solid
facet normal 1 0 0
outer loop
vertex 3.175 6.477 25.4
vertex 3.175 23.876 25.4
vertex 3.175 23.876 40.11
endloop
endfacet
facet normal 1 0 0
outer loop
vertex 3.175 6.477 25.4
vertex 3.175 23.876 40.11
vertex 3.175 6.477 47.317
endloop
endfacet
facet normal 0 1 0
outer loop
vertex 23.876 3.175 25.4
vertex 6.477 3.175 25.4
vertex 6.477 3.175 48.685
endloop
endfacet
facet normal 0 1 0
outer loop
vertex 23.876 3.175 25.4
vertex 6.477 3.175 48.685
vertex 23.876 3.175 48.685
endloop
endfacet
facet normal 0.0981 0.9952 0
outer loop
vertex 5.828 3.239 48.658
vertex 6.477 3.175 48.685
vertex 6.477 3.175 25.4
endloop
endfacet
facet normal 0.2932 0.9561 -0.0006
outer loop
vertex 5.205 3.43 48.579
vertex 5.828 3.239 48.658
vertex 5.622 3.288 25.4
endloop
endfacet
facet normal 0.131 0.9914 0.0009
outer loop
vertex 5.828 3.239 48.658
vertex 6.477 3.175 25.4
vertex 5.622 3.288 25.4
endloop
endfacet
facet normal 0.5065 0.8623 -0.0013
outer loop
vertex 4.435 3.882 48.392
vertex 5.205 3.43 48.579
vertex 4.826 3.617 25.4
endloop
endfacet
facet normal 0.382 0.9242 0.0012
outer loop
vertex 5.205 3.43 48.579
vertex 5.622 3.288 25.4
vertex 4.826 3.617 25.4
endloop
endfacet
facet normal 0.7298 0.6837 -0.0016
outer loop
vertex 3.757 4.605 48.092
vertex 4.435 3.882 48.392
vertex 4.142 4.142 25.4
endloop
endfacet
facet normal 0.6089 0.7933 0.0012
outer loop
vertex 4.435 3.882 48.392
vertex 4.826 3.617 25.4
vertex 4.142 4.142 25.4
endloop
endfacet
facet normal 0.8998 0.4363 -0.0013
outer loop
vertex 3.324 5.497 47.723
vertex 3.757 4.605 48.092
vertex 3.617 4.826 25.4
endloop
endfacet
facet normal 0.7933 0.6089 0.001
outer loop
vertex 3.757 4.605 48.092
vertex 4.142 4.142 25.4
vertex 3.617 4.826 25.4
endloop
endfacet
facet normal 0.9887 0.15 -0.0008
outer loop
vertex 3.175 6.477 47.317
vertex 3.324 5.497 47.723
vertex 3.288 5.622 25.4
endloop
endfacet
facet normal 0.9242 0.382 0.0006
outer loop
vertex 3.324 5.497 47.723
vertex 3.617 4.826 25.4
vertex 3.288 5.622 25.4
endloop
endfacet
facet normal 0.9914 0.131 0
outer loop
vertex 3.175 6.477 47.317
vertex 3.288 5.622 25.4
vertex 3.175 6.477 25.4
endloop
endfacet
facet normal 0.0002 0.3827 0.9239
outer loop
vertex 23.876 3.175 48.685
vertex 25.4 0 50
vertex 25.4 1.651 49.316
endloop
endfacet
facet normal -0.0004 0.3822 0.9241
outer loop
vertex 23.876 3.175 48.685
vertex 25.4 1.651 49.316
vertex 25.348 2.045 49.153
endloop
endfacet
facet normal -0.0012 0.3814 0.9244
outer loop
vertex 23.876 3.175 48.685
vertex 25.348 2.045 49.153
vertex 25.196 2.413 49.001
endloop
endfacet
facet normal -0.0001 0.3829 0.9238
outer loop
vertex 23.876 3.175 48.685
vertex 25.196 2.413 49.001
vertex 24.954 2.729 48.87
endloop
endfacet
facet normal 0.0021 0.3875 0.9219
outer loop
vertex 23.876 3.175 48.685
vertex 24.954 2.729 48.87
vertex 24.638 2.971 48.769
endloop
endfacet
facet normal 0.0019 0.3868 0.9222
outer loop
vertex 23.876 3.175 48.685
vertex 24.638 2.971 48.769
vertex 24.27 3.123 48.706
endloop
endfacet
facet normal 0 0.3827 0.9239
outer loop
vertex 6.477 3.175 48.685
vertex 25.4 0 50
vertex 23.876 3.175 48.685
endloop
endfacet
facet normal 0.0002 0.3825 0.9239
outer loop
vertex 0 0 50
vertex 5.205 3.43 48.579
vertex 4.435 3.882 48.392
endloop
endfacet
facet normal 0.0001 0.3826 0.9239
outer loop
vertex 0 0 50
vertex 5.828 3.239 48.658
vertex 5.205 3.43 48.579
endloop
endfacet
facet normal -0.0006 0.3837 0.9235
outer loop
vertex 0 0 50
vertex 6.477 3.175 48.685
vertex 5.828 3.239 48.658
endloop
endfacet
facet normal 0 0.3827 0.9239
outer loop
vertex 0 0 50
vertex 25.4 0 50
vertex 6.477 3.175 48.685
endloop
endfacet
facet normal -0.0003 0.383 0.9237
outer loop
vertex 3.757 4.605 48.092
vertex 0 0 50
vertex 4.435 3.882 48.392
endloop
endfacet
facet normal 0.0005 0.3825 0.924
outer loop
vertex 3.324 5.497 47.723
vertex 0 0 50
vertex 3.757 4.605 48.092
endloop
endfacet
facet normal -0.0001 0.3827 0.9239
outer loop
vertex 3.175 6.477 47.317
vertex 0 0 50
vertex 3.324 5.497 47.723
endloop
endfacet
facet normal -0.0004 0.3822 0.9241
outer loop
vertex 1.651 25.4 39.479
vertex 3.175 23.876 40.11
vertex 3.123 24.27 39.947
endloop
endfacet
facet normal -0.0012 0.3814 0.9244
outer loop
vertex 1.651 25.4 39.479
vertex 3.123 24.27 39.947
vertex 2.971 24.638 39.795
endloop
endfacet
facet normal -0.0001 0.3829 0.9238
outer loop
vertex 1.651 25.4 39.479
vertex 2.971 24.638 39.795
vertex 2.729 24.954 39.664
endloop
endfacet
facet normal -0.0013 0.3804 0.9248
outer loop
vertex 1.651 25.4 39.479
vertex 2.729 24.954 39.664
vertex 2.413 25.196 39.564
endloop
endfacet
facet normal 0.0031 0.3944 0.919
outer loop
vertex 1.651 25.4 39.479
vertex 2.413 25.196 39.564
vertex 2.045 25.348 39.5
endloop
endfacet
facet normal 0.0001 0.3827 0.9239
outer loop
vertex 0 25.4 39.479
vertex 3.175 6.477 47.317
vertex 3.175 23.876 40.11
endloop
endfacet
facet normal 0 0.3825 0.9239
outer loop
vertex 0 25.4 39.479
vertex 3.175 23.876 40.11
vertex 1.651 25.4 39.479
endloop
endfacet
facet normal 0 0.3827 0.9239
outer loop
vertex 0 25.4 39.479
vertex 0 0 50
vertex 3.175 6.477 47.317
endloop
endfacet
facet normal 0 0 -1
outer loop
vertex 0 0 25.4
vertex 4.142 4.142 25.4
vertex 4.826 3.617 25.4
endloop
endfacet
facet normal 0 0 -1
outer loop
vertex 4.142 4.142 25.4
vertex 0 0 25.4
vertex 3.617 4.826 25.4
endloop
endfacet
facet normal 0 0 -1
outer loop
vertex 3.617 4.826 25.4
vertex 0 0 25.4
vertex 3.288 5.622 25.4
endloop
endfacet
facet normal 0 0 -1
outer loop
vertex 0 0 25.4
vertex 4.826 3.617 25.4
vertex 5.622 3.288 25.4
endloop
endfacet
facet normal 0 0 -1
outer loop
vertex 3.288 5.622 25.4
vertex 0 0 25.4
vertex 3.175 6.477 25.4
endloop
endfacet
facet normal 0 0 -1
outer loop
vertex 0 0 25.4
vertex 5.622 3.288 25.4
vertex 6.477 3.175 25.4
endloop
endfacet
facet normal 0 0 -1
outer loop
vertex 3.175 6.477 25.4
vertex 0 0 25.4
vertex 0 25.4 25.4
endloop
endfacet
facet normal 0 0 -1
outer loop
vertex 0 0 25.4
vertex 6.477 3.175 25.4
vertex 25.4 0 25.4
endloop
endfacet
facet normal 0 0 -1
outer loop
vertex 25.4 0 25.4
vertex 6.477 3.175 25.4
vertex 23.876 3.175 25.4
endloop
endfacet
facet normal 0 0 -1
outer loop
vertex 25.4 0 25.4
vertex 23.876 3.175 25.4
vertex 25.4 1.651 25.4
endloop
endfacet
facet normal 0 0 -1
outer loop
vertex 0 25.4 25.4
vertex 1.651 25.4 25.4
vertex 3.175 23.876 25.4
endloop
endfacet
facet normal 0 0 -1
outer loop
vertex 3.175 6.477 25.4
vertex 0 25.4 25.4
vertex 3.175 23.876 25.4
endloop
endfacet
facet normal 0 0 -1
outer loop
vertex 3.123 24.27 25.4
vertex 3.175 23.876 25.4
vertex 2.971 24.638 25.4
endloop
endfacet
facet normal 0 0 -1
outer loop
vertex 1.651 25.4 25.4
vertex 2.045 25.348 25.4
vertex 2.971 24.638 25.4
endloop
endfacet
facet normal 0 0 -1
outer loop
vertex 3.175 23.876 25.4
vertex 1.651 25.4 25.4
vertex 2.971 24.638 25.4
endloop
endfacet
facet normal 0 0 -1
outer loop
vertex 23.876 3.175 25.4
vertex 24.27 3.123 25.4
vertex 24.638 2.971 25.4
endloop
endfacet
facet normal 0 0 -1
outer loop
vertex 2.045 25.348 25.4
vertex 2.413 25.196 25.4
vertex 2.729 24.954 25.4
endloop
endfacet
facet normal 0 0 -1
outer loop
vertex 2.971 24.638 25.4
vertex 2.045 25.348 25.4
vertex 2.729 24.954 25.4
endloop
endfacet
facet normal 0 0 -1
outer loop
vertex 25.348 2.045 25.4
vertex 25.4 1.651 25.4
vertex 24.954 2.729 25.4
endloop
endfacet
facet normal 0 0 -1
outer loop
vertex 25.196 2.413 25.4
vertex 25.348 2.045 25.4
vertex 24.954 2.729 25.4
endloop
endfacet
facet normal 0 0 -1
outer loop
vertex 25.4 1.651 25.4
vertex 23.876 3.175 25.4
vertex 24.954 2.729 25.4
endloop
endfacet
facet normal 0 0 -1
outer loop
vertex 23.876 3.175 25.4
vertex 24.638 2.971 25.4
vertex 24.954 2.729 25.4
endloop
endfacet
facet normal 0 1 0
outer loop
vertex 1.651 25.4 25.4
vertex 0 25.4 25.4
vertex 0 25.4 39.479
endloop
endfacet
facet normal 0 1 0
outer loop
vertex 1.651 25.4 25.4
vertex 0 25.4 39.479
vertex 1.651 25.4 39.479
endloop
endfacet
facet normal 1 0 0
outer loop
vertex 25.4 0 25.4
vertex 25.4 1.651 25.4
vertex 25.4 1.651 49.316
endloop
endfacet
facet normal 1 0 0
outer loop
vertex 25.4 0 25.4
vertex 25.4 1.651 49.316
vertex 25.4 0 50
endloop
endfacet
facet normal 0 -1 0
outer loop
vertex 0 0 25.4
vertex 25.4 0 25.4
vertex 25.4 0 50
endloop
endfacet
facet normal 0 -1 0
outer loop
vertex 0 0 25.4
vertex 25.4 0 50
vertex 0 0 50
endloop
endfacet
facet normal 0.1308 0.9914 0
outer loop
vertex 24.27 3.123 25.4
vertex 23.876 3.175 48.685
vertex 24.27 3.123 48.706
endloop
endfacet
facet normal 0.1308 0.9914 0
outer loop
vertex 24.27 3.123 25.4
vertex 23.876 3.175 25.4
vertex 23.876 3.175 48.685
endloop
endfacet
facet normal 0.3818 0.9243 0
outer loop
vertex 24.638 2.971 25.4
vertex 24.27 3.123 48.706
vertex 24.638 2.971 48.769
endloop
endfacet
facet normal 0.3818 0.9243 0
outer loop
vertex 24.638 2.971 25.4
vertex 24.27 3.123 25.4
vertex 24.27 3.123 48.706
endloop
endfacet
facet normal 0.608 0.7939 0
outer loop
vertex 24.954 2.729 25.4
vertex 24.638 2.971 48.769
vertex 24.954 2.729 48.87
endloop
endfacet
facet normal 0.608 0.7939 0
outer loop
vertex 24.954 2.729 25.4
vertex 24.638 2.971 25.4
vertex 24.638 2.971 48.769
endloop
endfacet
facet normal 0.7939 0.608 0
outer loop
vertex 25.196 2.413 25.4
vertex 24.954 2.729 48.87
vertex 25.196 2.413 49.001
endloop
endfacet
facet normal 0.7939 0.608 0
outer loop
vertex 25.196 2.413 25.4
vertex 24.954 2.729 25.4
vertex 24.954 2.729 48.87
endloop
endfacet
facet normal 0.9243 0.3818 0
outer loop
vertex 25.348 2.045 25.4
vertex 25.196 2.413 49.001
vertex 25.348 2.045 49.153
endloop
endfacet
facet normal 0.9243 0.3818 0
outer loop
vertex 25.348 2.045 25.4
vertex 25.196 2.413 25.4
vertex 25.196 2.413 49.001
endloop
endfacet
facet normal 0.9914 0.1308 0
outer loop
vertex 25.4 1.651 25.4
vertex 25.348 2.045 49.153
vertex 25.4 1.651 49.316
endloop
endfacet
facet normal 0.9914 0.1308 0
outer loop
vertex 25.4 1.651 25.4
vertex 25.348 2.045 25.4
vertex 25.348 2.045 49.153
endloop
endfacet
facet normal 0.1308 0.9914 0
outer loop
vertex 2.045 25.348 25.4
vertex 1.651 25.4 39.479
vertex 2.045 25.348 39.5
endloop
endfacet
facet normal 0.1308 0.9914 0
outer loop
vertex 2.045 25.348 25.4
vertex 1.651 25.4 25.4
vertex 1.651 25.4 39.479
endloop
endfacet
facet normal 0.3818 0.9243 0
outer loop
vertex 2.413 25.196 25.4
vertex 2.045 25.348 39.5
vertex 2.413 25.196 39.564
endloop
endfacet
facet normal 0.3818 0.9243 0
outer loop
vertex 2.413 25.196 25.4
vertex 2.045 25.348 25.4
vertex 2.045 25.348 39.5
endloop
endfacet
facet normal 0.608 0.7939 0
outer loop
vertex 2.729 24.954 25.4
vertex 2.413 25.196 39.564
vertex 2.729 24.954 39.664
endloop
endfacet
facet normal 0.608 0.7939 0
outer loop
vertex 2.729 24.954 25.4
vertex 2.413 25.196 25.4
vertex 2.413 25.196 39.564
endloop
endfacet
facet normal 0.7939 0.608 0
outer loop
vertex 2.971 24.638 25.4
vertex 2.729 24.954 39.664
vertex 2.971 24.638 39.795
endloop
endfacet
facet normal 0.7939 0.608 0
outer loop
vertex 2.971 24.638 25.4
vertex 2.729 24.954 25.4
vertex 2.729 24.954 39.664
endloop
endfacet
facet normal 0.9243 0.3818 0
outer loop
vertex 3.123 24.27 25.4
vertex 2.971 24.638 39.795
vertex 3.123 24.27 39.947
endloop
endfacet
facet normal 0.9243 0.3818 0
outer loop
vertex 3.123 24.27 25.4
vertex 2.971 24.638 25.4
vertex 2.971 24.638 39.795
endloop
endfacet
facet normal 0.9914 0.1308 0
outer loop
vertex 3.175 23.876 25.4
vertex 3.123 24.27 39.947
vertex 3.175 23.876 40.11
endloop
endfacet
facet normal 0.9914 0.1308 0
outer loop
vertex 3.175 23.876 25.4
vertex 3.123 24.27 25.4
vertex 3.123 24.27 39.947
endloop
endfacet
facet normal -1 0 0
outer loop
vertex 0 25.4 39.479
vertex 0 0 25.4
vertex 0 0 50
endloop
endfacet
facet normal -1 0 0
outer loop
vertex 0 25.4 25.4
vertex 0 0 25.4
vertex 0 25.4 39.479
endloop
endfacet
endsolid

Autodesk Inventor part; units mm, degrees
ref_plane "Start Plane" through (0, 0, 25.4) normal (0, 0, 1) x (1, 0, 0)
ref_plane "End Plane" through (0, 0, 50) normal (0, 0, 1) x (1, 0, 0)
sketch "Sketch" plane through (0, 0, 0) normal (0, 0, 1) x (1, 0, 0)
  line L0 (25.4, 0) -> (0, 0)
  line L1 (0, 0) -> (0, 25.4)
  line L2 (0, 25.4) -> (1.651, 25.4)
  line L3 (3.175, 23.876) -> (3.175, 6.477)
  line L4 (6.477, 3.175) -> (23.876, 3.175)
  line L5 (25.4, 1.651) -> (25.4, 0)
  line L6 (0, -11.0414) -> (0, 31.5385) construction
  line L7 (-11.0414, 0) -> (31.5385, 0) construction
  arc A0 (3.175, 6.477) -> (6.477, 3.175) centre (6.477, 6.477) ccw
  arc A1 (3.175, 23.876) -> (1.651, 25.4) centre (1.651, 23.876) ccw
  arc A2 (25.4, 1.651) -> (23.876, 3.175) centre (23.876, 1.651) ccw
  line L8 (0, 40.0545) -> (0, -19.5574) construction
  line L9 (-19.5574, 0) -> (40.0545, 0) construction
  point P0 (3.175, 25.4)
  point P1 (3.175, 3.175)
  point P2 (25.4, 3.175)
  dimension "d0" = 25.4
  dimension "d1" = 25.4
  dimension "d2" = 3.175
  dimension "d3" = 3.175
  dimension "d10" = 0
  dimension "d11" = 0
  dimension "d14" = 3.302
  dimension "d15" = 1.524
extrude "Body" add sketch "Sketch" along normal up to surface (24.6 mm away) from surface at 25.4
sketch "Sketch3" plane through (0, 0, 0) normal (0, 0, 1) x (1, 0, 0)
  line L0 (0, 0) -> (10, 0)
ref_plane "Work Plane3" through (0, 0, 0) normal (0, -1, 0) x (1, 0, 0)
ref_plane "Work Plane4" through (12.7, 0, 50) normal (0, 0.3827, 0.9239) x (1, 0, 0)
split "Split1" plane through (12.7, 0, 50) removes the side toward (0, 0.3827, 0.9239)
ref_plane "Work Plane5" through (0, 1058.349, 25.4) normal (0, 0, -1) x (-1, 0, 0)
split "Split2" plane through (0, 1058.349, 25.4) removes the side toward (0, 0, -1)
sketch "Sketch4" plane through (0, 0, 0) normal (0, -1, 0) x (1, 0, 0)
  line L0 (-2, 25.4) -> (12, 25.4) projected
  line L1 (-2, 50) -> (12, 50) projected
  dimension "d17" = 24.6
equation "\"d0\" = G_H"
equation "\"d1\" = G_H"
equation "\"d2\" = G_T"
equation "\"d3\" = G_T"
equation "\"d14\" = G_IR"
equation "\"d15\" = G_ER"
equation "\"d4\" = G_L"
equation "\"G_H\" = 25.4"
equation "\"G_T\" = 3.175"
equation "\"G_ER\" = 1.524"
equation "\"G_IR\" = 3.302"
equation "\"G_L\" = d17"
equation "\"ex\" = 0"
equation "\"G_OFFSET_START\" = -25.4"
equation "\"G_OFFSET_END\" = 0"
equation "\"d12\" = -G_OFFSET_START"
equation "\"d13\" = G_OFFSET_END + B_L"
equation "\"B_L\" = 50"
properties part number "AISC - L 1 x 1 x 1/8 - 0.969" material "Steel, Mild"
